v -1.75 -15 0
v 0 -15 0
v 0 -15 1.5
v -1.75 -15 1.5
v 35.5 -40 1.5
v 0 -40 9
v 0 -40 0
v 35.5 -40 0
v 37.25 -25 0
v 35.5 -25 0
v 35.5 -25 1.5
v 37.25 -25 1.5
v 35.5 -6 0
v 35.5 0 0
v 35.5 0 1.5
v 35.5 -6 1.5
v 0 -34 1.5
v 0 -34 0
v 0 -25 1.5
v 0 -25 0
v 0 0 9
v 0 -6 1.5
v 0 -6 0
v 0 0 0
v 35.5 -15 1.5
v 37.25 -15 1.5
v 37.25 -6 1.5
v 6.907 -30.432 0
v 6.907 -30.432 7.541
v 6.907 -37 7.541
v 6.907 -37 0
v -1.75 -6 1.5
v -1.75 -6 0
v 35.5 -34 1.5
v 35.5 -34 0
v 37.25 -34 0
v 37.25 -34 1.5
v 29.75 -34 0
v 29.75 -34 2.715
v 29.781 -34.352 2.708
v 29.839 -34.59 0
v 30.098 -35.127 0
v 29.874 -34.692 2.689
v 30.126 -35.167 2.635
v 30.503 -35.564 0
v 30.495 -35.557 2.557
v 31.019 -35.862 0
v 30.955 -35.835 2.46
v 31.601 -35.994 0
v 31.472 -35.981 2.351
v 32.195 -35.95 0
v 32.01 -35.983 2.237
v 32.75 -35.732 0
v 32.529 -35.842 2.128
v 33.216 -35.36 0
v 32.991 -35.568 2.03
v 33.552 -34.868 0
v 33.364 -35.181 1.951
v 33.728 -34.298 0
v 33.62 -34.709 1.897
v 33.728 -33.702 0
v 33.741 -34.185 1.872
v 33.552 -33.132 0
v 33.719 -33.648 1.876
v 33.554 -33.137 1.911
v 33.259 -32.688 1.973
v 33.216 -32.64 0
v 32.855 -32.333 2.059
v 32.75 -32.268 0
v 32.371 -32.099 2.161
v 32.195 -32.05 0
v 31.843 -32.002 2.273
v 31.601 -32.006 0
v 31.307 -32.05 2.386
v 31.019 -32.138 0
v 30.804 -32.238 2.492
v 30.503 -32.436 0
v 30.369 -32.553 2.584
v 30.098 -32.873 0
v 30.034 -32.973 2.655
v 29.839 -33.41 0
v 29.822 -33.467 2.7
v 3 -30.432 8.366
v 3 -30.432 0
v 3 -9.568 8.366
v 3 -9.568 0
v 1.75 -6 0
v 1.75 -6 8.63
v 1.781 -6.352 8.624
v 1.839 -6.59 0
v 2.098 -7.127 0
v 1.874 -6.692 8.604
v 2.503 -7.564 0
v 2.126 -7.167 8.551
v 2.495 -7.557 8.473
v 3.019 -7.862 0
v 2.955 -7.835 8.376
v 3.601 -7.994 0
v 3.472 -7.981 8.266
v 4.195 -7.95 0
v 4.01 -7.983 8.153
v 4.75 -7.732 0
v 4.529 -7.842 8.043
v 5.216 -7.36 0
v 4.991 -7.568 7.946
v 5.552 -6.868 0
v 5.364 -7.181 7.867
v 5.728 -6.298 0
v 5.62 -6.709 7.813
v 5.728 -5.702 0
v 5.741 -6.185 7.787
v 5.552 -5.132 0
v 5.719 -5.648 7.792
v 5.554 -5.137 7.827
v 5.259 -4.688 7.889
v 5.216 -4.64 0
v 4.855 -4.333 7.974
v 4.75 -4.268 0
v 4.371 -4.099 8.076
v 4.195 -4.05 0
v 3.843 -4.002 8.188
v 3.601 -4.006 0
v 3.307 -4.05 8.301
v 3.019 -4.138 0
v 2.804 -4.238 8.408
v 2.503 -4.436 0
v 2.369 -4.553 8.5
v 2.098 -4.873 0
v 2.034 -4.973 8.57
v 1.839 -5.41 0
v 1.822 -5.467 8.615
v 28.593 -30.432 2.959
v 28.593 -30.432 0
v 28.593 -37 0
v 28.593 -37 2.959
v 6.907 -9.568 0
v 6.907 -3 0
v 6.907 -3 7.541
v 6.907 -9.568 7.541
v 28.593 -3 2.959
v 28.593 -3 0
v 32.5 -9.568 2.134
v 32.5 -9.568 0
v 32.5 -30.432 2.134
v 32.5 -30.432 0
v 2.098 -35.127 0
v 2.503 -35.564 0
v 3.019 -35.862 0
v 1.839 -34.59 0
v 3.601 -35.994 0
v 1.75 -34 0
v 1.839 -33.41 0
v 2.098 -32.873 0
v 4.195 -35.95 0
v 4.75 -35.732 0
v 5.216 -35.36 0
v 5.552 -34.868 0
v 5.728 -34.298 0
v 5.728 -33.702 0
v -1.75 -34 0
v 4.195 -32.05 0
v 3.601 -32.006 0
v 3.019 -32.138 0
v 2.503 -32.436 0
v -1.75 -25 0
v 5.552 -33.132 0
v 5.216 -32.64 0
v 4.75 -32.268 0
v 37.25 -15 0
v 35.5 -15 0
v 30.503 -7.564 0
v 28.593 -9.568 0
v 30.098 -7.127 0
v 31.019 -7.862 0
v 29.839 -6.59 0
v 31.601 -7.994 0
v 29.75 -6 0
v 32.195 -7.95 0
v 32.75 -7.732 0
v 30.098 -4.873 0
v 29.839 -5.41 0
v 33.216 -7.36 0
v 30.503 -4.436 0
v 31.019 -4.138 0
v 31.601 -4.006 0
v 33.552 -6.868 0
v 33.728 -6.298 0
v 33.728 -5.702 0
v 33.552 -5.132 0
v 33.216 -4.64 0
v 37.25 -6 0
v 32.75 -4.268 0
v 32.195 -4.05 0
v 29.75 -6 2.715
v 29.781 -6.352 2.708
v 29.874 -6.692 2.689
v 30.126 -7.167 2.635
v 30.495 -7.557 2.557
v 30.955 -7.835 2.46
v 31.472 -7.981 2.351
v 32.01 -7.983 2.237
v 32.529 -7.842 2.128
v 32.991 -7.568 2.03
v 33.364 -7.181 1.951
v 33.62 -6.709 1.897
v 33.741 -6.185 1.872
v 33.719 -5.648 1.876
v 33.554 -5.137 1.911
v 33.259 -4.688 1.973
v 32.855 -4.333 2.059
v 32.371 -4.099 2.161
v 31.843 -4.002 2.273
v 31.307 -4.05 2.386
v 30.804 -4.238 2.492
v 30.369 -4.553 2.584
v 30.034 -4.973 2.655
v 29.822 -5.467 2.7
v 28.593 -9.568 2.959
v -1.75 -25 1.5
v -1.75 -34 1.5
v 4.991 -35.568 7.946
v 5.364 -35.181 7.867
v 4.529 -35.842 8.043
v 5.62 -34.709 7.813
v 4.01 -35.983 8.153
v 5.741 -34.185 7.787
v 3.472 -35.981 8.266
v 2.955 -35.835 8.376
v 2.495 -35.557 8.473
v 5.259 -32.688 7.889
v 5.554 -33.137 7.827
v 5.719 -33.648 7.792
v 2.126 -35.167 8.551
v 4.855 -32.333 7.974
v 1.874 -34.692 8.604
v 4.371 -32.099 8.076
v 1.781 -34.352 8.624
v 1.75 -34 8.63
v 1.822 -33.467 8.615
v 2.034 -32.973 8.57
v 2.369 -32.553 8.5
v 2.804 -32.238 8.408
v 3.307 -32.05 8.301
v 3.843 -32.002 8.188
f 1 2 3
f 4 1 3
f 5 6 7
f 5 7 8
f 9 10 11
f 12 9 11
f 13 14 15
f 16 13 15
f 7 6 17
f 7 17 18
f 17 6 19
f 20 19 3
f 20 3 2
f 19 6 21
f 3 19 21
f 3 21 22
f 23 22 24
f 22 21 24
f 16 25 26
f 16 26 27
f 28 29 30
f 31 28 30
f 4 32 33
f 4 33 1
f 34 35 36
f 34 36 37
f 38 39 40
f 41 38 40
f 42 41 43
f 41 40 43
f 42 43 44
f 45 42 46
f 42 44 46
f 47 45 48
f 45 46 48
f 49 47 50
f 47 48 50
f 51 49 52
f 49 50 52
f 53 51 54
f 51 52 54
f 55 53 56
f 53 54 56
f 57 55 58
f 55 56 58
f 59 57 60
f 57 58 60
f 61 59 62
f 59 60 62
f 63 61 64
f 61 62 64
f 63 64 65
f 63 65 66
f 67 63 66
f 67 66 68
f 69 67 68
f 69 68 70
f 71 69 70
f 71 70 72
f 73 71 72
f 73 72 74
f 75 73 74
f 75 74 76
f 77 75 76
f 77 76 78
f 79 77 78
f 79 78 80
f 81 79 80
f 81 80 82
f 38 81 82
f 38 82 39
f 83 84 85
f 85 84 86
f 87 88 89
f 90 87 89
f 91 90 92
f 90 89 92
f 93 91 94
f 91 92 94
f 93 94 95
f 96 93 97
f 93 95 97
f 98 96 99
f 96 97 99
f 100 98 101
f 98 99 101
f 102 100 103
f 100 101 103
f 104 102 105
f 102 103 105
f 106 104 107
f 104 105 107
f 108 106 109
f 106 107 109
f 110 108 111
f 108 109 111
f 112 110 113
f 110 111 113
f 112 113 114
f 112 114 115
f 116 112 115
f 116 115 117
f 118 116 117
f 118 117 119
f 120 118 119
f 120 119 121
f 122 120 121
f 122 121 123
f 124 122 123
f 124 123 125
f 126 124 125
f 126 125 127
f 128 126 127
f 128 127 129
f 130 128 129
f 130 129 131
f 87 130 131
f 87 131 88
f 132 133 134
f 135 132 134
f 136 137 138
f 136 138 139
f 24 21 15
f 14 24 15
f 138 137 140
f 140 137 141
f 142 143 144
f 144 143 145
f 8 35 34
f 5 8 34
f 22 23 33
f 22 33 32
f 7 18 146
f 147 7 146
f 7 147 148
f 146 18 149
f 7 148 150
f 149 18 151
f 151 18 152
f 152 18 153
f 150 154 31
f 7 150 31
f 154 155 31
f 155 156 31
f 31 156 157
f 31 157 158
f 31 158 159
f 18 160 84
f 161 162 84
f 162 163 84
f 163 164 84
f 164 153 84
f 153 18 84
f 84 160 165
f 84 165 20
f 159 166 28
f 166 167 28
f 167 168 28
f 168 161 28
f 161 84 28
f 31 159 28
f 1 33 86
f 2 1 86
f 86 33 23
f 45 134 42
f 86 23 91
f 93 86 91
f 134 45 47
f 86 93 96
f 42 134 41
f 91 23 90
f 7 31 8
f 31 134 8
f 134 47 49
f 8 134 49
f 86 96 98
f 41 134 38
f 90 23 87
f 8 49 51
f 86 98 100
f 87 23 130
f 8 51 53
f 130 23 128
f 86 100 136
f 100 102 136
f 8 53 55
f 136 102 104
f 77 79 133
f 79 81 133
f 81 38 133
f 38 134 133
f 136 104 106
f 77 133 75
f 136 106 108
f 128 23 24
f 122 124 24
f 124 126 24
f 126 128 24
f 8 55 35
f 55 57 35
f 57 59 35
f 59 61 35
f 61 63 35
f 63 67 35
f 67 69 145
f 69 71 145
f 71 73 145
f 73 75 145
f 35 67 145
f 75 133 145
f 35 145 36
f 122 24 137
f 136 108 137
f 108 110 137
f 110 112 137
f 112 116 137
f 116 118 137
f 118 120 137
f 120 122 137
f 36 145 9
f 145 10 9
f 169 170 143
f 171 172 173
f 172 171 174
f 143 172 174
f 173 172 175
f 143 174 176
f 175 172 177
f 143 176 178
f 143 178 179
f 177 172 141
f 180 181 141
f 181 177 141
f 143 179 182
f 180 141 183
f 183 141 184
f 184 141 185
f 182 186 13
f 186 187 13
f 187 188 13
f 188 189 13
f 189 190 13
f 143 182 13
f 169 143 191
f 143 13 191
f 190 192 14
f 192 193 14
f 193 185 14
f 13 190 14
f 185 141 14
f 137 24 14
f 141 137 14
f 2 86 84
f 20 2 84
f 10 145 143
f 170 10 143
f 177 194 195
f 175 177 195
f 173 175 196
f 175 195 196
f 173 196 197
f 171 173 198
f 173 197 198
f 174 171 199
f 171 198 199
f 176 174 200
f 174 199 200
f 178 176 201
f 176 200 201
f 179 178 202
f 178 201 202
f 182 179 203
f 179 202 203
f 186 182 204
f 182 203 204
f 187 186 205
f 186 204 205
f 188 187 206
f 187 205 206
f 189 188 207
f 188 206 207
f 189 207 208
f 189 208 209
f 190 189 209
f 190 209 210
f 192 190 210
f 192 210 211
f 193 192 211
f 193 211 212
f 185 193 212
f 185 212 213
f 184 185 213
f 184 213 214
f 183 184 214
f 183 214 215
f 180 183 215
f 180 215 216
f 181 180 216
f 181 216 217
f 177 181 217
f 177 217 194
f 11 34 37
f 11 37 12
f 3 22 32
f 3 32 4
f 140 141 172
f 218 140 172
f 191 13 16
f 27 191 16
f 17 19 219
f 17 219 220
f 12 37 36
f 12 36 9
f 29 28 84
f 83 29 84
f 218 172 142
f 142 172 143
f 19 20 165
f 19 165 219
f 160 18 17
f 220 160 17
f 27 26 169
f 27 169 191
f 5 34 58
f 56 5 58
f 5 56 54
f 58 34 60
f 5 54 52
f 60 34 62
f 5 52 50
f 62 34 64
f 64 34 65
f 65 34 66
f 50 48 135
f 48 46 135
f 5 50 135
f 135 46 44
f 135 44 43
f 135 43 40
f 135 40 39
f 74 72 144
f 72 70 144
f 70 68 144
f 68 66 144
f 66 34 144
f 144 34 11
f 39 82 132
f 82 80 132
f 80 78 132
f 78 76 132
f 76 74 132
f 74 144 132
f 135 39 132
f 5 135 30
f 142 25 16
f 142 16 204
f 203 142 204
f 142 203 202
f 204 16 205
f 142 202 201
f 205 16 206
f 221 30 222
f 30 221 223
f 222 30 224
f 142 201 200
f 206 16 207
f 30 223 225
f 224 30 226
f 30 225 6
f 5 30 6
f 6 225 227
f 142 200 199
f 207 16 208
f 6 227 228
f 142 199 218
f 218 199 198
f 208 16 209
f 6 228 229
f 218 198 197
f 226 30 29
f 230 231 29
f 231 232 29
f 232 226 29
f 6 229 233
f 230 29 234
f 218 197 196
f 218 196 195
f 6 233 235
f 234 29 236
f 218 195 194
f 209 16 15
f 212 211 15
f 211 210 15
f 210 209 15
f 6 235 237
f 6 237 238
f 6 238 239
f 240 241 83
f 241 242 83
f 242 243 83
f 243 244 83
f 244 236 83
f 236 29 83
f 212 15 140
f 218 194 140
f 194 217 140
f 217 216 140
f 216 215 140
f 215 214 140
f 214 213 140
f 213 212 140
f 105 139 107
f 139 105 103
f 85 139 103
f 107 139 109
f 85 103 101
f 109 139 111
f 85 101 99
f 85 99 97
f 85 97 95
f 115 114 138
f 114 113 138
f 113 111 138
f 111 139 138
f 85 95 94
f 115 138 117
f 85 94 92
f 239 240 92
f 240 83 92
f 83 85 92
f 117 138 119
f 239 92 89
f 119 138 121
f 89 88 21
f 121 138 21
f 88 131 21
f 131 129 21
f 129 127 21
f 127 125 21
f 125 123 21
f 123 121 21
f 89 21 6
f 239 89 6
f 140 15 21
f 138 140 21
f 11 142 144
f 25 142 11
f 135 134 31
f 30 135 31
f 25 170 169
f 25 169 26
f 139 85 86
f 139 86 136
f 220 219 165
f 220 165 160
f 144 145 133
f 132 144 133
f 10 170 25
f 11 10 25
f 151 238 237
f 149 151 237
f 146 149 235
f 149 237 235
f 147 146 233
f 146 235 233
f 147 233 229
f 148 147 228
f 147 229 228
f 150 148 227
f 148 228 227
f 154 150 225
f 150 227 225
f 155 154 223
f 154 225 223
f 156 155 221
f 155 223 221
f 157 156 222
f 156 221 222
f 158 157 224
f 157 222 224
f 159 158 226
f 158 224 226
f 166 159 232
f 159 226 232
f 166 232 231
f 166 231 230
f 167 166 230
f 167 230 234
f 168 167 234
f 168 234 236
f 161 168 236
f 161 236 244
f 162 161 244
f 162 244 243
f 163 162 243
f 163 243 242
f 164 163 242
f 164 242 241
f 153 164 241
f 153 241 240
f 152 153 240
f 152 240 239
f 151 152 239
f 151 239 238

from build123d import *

# Parameters (mm, degrees)
F1_DEPTH = 40
F3_D     = 4
F4_W     = 9
F4_H     = 1.5
F5_DEPTH = 1.75
F6_W     = 9
F6_H     = 1.5
F7_DEPTH = 1.75
F8_W     = 10.8425548855
F8_H     = 10.4324881697
F8_W_2   = 3.9074451145
F8_H_2   = 6.5675118303
F9_DEPTH = 9.001


with BuildPart() as f1:
    # F0 (on Front) → F1 (new body)
    with BuildSketch(Plane.XZ):
        Polygon((0, 9), (0, 0), (35.5, 0), (35.5, 1.5), align=None)
    extrude(amount=F1_DEPTH)

    # F3 (through all)
    with Locations(Plane(origin=(0, 0, 0), x_dir=(1, 0, 0), z_dir=(0, 0, -1))):
        with Locations((3.75, 34), (31.75, 34), (31.75, 6), (3.75, 6)):
            Hole(F3_D / 2)

    # F4 (on face) → F5 (join)
    with BuildSketch(Plane(origin=(0, 0, 0), x_dir=(0, -1, 0), z_dir=(-1, 0, 0))):
        with Locations((29.5, 0.75)):
            Rectangle(F4_W, F4_H)
        with Locations((10.5, 0.75)):
            Rectangle(F4_W, F4_H)
    extrude(amount=F5_DEPTH)

    # F6 (on face) → F7 (join)
    with BuildSketch(Plane.YZ.offset(35.5)):
        with Locations((-10.5, 0.75)):
            Rectangle(F6_W, F6_H)
        with Locations((-29.5, 0.75)):
            Rectangle(F6_W, F6_H)
    extrude(amount=F7_DEPTH)

    # F8 (on face) → F9 (cut, through all)
    with BuildSketch(Plane(origin=(0, 0, 0), x_dir=(1, 0, 0), z_dir=(0, 0, -1))):
        with Locations((23.1712774428, 25.2162440849)):
            Rectangle(F8_W, F8_H)
        with Locations((12.3287225572, 14.7837559151)):
            Rectangle(F8_W, F8_H)
        with Locations((12.3287225572, 25.2162440849)):
            Rectangle(F8_W, F8_H)
        with Locations((23.1712774428, 14.7837559151)):
            Rectangle(F8_W, F8_H)
        with Locations((30.5462774428, 25.2162440849)):
            Rectangle(F8_W_2, F8_H)
        with Locations((30.5462774428, 14.7837559151)):
            Rectangle(F8_W_2, F8_H)
        with Locations((4.9537225572, 14.7837559151)):
            Rectangle(F8_W_2, F8_H)
        with Locations((4.9537225572, 25.2162440849)):
            Rectangle(F8_W_2, F8_H)
        with Locations((12.3287225572, 33.7162440849)):
            Rectangle(F8_W, F8_H_2)
        with Locations((23.1712774428, 33.7162440849)):
            Rectangle(F8_W, F8_H_2)
        with Locations((23.1712774428, 6.2837559151)):
            Rectangle(F8_W, F8_H_2)
        with Locations((12.3287225572, 6.2837559151)):
            Rectangle(F8_W, F8_H_2)
    extrude(amount=-F9_DEPTH, mode=Mode.SUBTRACT)


solid = f1.part
